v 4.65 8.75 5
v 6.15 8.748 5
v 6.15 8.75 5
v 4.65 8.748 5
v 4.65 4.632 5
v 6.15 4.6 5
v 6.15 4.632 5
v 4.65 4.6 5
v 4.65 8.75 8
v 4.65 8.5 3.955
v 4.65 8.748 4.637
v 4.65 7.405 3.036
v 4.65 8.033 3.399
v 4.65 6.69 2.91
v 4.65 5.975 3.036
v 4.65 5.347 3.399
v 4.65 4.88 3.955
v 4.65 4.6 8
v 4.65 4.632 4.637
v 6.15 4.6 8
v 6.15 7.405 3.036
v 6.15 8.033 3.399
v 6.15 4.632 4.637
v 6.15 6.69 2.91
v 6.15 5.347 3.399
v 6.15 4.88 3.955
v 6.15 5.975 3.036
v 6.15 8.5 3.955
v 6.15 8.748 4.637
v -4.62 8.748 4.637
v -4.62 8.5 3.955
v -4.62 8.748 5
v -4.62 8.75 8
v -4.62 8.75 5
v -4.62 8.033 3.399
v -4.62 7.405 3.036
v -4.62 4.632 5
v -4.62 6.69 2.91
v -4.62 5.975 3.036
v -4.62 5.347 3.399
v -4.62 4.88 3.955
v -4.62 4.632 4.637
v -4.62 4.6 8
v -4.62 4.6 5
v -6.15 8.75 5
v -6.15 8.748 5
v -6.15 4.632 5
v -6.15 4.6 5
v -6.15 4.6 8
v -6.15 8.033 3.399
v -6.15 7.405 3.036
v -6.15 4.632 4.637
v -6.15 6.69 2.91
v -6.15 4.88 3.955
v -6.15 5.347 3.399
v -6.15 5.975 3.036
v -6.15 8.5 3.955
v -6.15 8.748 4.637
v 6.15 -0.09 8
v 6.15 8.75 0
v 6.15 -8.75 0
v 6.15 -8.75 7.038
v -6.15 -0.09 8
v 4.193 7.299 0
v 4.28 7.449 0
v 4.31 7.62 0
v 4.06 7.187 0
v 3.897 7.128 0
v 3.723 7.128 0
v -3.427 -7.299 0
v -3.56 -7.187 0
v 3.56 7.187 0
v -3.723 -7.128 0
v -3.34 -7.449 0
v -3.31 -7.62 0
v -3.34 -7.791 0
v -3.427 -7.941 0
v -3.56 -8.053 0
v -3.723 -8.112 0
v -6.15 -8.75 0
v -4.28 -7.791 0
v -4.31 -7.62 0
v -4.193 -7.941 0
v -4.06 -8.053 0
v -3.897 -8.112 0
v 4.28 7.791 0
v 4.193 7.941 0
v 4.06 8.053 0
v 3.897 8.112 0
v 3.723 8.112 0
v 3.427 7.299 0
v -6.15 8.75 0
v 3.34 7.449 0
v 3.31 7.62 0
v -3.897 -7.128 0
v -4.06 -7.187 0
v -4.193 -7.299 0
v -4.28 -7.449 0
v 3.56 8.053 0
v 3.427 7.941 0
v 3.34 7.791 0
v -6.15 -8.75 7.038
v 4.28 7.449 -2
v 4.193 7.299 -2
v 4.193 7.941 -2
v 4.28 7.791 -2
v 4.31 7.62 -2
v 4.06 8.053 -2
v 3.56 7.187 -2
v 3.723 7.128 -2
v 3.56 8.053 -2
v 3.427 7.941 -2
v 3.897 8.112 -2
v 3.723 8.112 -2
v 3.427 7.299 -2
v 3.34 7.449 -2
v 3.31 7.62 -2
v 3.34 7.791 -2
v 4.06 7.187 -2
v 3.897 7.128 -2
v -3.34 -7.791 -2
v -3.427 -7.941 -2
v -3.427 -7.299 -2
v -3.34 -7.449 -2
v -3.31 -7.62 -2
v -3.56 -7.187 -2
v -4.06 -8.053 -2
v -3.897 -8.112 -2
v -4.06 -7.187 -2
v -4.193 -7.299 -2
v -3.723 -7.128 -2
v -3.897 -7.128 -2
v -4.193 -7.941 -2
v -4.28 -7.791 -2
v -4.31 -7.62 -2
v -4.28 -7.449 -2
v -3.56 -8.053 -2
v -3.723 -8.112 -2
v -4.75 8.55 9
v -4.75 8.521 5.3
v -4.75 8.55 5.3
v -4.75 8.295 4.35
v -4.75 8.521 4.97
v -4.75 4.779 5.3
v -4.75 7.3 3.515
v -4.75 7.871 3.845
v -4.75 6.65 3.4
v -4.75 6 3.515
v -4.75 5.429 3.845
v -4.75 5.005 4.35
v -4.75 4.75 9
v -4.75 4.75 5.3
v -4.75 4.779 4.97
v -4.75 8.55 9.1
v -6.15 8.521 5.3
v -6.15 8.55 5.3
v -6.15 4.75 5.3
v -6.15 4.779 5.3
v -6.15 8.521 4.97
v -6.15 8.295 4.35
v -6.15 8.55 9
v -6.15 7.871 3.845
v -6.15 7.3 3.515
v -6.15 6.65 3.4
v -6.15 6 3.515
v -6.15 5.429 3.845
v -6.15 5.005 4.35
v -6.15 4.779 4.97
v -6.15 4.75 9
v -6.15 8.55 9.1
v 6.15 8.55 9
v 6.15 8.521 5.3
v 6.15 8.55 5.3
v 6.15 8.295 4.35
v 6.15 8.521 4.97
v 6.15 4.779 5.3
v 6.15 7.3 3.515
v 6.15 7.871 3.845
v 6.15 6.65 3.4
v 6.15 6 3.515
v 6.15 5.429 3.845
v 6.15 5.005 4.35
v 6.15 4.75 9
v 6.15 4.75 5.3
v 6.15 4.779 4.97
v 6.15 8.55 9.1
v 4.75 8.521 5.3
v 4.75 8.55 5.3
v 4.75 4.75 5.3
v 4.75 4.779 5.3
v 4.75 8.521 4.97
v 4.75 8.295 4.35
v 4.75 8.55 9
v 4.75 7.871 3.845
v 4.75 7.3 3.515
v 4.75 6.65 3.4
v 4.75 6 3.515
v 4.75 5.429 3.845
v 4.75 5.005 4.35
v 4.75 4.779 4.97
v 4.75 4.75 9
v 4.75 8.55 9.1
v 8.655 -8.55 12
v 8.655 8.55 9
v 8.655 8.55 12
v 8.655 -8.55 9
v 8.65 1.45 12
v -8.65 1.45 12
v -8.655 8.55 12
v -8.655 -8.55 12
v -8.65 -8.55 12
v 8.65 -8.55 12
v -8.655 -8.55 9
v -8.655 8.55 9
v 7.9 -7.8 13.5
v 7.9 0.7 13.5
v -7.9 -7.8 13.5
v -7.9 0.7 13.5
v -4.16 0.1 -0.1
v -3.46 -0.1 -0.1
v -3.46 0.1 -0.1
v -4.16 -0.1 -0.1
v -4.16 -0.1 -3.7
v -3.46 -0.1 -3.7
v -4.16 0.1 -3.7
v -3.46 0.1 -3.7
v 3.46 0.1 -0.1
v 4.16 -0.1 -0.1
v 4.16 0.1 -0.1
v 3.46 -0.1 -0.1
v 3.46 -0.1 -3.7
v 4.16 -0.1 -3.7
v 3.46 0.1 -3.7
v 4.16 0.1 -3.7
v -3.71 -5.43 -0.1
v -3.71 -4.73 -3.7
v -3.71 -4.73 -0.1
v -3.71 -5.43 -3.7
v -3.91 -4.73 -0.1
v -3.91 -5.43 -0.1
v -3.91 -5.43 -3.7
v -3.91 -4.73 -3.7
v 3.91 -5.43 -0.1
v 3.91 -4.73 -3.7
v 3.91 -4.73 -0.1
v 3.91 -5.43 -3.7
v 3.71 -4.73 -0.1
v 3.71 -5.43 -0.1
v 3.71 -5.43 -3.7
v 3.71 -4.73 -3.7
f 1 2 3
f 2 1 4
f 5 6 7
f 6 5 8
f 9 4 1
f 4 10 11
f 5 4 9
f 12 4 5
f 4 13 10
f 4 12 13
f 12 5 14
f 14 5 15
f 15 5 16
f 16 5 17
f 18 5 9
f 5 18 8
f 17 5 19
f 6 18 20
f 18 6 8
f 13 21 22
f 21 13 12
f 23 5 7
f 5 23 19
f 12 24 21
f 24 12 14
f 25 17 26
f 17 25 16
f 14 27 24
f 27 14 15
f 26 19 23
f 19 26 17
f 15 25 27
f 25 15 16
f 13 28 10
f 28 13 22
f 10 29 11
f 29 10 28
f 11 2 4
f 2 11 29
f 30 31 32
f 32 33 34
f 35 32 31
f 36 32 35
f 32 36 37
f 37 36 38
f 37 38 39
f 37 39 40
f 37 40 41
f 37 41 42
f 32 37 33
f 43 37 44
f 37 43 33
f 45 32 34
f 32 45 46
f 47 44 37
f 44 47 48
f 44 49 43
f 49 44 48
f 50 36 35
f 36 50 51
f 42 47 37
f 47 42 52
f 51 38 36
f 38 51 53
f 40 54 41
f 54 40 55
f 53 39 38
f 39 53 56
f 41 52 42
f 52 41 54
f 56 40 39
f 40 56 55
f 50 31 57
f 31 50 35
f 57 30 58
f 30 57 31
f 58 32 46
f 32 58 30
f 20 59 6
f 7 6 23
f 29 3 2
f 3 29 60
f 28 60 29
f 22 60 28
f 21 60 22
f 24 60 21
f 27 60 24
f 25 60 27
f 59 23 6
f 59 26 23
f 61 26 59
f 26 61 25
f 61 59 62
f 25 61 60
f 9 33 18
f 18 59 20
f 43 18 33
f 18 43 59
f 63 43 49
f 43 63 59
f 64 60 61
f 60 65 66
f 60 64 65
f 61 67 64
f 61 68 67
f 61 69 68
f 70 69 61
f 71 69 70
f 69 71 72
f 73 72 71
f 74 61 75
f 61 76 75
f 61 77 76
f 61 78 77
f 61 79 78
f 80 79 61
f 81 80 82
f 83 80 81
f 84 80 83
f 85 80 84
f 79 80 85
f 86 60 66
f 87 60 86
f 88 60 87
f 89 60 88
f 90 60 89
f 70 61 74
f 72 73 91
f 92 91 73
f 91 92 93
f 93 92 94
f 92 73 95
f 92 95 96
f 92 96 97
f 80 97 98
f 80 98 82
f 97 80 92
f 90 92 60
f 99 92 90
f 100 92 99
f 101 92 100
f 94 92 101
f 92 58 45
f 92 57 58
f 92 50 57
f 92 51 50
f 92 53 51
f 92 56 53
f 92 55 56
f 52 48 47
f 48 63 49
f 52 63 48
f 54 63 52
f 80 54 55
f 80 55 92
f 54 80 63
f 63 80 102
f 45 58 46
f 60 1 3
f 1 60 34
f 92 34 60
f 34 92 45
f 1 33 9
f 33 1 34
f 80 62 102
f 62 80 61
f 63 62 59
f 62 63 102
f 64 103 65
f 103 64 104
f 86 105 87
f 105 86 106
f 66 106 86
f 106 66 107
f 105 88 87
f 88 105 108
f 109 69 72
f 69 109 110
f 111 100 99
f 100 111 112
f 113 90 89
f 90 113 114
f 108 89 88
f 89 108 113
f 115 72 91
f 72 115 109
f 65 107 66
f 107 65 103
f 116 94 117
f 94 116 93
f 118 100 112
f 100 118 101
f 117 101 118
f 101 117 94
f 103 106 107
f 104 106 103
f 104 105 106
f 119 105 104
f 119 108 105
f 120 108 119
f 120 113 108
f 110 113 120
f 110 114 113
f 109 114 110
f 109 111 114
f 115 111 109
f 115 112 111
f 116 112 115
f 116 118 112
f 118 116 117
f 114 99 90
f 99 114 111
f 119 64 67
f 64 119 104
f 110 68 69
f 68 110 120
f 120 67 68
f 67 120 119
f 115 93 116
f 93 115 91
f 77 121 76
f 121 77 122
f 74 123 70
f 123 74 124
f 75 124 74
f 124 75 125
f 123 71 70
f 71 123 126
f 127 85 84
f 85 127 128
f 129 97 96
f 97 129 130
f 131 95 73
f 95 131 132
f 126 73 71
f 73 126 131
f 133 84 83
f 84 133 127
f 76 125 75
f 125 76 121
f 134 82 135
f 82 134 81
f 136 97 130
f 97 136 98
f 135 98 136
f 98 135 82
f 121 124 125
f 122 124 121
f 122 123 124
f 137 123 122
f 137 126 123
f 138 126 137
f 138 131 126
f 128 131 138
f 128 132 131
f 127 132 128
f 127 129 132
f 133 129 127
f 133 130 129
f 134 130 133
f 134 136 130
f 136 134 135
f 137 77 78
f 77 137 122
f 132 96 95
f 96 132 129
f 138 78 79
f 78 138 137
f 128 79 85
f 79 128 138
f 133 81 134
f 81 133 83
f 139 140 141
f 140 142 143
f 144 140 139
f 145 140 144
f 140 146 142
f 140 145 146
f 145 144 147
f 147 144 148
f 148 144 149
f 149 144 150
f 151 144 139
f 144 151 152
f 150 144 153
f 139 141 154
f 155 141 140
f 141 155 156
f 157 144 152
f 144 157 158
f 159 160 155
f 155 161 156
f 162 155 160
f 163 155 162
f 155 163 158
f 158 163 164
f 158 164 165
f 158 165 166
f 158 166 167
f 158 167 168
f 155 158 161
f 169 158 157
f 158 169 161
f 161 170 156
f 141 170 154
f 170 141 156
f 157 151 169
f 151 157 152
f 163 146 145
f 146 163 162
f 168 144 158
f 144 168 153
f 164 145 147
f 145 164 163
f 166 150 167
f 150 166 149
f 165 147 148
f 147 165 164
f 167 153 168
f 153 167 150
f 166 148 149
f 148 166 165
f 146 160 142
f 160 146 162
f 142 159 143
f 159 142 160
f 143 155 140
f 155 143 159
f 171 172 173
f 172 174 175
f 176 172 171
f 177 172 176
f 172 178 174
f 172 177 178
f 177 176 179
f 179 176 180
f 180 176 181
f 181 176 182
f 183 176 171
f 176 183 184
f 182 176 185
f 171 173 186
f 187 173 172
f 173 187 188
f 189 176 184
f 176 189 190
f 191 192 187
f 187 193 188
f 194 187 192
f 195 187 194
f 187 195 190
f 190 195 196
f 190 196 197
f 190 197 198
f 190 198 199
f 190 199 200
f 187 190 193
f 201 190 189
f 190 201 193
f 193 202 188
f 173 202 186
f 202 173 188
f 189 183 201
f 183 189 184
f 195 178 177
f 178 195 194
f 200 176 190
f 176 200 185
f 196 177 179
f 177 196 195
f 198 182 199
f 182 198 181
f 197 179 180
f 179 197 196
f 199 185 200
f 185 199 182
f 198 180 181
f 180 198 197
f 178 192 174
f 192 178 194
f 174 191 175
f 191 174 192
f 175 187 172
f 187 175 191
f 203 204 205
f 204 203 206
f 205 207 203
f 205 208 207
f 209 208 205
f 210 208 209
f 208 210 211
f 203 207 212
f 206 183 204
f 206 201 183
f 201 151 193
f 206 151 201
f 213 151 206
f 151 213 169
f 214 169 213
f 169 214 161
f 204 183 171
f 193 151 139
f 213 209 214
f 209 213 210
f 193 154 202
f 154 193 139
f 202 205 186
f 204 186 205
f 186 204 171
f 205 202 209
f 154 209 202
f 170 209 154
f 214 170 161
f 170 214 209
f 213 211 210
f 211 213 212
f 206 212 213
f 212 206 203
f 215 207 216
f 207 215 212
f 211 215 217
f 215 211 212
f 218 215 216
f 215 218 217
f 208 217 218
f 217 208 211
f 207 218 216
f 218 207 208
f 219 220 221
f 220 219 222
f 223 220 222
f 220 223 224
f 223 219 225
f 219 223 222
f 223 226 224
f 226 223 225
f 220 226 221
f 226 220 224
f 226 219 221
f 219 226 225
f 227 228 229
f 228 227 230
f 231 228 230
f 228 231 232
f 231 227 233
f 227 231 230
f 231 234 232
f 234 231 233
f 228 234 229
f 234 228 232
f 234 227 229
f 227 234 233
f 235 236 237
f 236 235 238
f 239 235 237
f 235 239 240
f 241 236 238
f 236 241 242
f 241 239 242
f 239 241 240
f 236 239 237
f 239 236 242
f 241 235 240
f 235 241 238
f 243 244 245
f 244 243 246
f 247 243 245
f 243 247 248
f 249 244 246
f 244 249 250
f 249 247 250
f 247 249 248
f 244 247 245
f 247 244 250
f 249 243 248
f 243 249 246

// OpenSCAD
// All dimensions in mm
// Author: Robert Loos

module prism4(l1,w1,l2,w2,h) {
    dl=(l1-l2)/2;
    dw=(w1-w2)/2;
    polyhedron(
    points=[[0,0,0],[l1,0,0],[l1,w1,0],[0,w1,0],
    [dl,dw,h],[dl+l2,dw,h],[dl+l2,dw+w2,h],[dl,dw+w2,h]],
    faces=[[0,1,2,3],[4,5,1,0],[5,6,2,1],[6,7,3,2],[7,4,0,3],[7,6,5,4]]);
}

module button_mount() {
    union() {
        cube(size=[1.4,3.8,3.8]);
        translate([0,1.9,0]) rotate (a=[0,90,0]) linear_extrude(1.4) circle(d=3.8,$fn=18);
    };
}

module led_hole(x,y) {
    translate([x,y,-2]) cylinder(d=3.5,h=10,$fn=18);
}

module led(x,y,z) {
    translate([x,y,-2.4+z]) color([1,0,0]) union() {
        cylinder(d=3,h=4,$fn=18);
        translate([0,0,4]) sphere(d=3,$fn=18);
    }
    pin(-1.27+x,y,90);
    pin(1.27+x,y,90);
}

// num_leds bust be 0, 1 or 2
// w is 12.3 for normal width and 17.3 for wide
module button(num_leds,w) {
    color([0.4,0.4,0.4]) translate ([0,0,10.5]) difference() {
        union() {
            cube(size=[w+.01,17.1,3],center=true);
            translate([-w/2,-8.55,1.5]) prism4(w,10,w-1.5,8.5,1.5);
            translate ([-6.15,8.55-3.8,-1.5-3.7]) button_mount();
            translate ([6.15-1.4,8.55-3.8,-1.5-3.7]) button_mount();
        }
        if (num_leds==1) {
            led_hole(0,5.08);
            led(0,5.08);
        }
        else if (num_leds==2)
        {
            led_hole(-2.54,5.08);
            led_hole(2.54,5.08);
        }
    }
    if (num_leds==1) {
        led(0,5.08,10.5);
    }
    if (num_leds==2) {
        led(-2.54,5.08,10.5);
        led(2.54,5.08,10.5);
    }
}

module nose() {
    color([0.8,0.8,0.8]) translate([0,0,-2]) cylinder(h=2,d=1,$fn=18);
}
module switch_base() {
    union() {
        difference() {
            color([.8,.8,.8]) cube(size=[12.3,17.5,8],center=true);
            translate ([4.65,8.55-3.95,1]) scale([1.1,1.1,1.1]) button_mount();
            translate ([-6.16,8.55-3.95,1]) scale([1.1,1.1,1.1]) button_mount();
        translate([10,0,4.01]) rotate([270,180,90]) linear_extrude(height=22) polygon(points=[[0,0],[9,0],[9,-1]]);
        }
        translate([3.81,7.62,-4]) nose();
        translate([-3.81,-7.62,-4]) nose();
    }
}

module pin(x,y,rot) {
    color([0.5,0.5,0.1]) translate([x,y,-.1]) rotate([0,0,rot]) translate([-.1,-.35,-3.6]) cube([0.2,0.7,3.6]);
}


translate([0,0,4]) switch_base();
// Set number of LEDs and Width to generate different types
button(0,17.3); // w=12.3 for normal, 17.3 for wide
pin(-3.81,0,90);
pin(3.81,0,90);
pin(-3.81,-5.08,0);
pin(3.81,-5.08,0);
